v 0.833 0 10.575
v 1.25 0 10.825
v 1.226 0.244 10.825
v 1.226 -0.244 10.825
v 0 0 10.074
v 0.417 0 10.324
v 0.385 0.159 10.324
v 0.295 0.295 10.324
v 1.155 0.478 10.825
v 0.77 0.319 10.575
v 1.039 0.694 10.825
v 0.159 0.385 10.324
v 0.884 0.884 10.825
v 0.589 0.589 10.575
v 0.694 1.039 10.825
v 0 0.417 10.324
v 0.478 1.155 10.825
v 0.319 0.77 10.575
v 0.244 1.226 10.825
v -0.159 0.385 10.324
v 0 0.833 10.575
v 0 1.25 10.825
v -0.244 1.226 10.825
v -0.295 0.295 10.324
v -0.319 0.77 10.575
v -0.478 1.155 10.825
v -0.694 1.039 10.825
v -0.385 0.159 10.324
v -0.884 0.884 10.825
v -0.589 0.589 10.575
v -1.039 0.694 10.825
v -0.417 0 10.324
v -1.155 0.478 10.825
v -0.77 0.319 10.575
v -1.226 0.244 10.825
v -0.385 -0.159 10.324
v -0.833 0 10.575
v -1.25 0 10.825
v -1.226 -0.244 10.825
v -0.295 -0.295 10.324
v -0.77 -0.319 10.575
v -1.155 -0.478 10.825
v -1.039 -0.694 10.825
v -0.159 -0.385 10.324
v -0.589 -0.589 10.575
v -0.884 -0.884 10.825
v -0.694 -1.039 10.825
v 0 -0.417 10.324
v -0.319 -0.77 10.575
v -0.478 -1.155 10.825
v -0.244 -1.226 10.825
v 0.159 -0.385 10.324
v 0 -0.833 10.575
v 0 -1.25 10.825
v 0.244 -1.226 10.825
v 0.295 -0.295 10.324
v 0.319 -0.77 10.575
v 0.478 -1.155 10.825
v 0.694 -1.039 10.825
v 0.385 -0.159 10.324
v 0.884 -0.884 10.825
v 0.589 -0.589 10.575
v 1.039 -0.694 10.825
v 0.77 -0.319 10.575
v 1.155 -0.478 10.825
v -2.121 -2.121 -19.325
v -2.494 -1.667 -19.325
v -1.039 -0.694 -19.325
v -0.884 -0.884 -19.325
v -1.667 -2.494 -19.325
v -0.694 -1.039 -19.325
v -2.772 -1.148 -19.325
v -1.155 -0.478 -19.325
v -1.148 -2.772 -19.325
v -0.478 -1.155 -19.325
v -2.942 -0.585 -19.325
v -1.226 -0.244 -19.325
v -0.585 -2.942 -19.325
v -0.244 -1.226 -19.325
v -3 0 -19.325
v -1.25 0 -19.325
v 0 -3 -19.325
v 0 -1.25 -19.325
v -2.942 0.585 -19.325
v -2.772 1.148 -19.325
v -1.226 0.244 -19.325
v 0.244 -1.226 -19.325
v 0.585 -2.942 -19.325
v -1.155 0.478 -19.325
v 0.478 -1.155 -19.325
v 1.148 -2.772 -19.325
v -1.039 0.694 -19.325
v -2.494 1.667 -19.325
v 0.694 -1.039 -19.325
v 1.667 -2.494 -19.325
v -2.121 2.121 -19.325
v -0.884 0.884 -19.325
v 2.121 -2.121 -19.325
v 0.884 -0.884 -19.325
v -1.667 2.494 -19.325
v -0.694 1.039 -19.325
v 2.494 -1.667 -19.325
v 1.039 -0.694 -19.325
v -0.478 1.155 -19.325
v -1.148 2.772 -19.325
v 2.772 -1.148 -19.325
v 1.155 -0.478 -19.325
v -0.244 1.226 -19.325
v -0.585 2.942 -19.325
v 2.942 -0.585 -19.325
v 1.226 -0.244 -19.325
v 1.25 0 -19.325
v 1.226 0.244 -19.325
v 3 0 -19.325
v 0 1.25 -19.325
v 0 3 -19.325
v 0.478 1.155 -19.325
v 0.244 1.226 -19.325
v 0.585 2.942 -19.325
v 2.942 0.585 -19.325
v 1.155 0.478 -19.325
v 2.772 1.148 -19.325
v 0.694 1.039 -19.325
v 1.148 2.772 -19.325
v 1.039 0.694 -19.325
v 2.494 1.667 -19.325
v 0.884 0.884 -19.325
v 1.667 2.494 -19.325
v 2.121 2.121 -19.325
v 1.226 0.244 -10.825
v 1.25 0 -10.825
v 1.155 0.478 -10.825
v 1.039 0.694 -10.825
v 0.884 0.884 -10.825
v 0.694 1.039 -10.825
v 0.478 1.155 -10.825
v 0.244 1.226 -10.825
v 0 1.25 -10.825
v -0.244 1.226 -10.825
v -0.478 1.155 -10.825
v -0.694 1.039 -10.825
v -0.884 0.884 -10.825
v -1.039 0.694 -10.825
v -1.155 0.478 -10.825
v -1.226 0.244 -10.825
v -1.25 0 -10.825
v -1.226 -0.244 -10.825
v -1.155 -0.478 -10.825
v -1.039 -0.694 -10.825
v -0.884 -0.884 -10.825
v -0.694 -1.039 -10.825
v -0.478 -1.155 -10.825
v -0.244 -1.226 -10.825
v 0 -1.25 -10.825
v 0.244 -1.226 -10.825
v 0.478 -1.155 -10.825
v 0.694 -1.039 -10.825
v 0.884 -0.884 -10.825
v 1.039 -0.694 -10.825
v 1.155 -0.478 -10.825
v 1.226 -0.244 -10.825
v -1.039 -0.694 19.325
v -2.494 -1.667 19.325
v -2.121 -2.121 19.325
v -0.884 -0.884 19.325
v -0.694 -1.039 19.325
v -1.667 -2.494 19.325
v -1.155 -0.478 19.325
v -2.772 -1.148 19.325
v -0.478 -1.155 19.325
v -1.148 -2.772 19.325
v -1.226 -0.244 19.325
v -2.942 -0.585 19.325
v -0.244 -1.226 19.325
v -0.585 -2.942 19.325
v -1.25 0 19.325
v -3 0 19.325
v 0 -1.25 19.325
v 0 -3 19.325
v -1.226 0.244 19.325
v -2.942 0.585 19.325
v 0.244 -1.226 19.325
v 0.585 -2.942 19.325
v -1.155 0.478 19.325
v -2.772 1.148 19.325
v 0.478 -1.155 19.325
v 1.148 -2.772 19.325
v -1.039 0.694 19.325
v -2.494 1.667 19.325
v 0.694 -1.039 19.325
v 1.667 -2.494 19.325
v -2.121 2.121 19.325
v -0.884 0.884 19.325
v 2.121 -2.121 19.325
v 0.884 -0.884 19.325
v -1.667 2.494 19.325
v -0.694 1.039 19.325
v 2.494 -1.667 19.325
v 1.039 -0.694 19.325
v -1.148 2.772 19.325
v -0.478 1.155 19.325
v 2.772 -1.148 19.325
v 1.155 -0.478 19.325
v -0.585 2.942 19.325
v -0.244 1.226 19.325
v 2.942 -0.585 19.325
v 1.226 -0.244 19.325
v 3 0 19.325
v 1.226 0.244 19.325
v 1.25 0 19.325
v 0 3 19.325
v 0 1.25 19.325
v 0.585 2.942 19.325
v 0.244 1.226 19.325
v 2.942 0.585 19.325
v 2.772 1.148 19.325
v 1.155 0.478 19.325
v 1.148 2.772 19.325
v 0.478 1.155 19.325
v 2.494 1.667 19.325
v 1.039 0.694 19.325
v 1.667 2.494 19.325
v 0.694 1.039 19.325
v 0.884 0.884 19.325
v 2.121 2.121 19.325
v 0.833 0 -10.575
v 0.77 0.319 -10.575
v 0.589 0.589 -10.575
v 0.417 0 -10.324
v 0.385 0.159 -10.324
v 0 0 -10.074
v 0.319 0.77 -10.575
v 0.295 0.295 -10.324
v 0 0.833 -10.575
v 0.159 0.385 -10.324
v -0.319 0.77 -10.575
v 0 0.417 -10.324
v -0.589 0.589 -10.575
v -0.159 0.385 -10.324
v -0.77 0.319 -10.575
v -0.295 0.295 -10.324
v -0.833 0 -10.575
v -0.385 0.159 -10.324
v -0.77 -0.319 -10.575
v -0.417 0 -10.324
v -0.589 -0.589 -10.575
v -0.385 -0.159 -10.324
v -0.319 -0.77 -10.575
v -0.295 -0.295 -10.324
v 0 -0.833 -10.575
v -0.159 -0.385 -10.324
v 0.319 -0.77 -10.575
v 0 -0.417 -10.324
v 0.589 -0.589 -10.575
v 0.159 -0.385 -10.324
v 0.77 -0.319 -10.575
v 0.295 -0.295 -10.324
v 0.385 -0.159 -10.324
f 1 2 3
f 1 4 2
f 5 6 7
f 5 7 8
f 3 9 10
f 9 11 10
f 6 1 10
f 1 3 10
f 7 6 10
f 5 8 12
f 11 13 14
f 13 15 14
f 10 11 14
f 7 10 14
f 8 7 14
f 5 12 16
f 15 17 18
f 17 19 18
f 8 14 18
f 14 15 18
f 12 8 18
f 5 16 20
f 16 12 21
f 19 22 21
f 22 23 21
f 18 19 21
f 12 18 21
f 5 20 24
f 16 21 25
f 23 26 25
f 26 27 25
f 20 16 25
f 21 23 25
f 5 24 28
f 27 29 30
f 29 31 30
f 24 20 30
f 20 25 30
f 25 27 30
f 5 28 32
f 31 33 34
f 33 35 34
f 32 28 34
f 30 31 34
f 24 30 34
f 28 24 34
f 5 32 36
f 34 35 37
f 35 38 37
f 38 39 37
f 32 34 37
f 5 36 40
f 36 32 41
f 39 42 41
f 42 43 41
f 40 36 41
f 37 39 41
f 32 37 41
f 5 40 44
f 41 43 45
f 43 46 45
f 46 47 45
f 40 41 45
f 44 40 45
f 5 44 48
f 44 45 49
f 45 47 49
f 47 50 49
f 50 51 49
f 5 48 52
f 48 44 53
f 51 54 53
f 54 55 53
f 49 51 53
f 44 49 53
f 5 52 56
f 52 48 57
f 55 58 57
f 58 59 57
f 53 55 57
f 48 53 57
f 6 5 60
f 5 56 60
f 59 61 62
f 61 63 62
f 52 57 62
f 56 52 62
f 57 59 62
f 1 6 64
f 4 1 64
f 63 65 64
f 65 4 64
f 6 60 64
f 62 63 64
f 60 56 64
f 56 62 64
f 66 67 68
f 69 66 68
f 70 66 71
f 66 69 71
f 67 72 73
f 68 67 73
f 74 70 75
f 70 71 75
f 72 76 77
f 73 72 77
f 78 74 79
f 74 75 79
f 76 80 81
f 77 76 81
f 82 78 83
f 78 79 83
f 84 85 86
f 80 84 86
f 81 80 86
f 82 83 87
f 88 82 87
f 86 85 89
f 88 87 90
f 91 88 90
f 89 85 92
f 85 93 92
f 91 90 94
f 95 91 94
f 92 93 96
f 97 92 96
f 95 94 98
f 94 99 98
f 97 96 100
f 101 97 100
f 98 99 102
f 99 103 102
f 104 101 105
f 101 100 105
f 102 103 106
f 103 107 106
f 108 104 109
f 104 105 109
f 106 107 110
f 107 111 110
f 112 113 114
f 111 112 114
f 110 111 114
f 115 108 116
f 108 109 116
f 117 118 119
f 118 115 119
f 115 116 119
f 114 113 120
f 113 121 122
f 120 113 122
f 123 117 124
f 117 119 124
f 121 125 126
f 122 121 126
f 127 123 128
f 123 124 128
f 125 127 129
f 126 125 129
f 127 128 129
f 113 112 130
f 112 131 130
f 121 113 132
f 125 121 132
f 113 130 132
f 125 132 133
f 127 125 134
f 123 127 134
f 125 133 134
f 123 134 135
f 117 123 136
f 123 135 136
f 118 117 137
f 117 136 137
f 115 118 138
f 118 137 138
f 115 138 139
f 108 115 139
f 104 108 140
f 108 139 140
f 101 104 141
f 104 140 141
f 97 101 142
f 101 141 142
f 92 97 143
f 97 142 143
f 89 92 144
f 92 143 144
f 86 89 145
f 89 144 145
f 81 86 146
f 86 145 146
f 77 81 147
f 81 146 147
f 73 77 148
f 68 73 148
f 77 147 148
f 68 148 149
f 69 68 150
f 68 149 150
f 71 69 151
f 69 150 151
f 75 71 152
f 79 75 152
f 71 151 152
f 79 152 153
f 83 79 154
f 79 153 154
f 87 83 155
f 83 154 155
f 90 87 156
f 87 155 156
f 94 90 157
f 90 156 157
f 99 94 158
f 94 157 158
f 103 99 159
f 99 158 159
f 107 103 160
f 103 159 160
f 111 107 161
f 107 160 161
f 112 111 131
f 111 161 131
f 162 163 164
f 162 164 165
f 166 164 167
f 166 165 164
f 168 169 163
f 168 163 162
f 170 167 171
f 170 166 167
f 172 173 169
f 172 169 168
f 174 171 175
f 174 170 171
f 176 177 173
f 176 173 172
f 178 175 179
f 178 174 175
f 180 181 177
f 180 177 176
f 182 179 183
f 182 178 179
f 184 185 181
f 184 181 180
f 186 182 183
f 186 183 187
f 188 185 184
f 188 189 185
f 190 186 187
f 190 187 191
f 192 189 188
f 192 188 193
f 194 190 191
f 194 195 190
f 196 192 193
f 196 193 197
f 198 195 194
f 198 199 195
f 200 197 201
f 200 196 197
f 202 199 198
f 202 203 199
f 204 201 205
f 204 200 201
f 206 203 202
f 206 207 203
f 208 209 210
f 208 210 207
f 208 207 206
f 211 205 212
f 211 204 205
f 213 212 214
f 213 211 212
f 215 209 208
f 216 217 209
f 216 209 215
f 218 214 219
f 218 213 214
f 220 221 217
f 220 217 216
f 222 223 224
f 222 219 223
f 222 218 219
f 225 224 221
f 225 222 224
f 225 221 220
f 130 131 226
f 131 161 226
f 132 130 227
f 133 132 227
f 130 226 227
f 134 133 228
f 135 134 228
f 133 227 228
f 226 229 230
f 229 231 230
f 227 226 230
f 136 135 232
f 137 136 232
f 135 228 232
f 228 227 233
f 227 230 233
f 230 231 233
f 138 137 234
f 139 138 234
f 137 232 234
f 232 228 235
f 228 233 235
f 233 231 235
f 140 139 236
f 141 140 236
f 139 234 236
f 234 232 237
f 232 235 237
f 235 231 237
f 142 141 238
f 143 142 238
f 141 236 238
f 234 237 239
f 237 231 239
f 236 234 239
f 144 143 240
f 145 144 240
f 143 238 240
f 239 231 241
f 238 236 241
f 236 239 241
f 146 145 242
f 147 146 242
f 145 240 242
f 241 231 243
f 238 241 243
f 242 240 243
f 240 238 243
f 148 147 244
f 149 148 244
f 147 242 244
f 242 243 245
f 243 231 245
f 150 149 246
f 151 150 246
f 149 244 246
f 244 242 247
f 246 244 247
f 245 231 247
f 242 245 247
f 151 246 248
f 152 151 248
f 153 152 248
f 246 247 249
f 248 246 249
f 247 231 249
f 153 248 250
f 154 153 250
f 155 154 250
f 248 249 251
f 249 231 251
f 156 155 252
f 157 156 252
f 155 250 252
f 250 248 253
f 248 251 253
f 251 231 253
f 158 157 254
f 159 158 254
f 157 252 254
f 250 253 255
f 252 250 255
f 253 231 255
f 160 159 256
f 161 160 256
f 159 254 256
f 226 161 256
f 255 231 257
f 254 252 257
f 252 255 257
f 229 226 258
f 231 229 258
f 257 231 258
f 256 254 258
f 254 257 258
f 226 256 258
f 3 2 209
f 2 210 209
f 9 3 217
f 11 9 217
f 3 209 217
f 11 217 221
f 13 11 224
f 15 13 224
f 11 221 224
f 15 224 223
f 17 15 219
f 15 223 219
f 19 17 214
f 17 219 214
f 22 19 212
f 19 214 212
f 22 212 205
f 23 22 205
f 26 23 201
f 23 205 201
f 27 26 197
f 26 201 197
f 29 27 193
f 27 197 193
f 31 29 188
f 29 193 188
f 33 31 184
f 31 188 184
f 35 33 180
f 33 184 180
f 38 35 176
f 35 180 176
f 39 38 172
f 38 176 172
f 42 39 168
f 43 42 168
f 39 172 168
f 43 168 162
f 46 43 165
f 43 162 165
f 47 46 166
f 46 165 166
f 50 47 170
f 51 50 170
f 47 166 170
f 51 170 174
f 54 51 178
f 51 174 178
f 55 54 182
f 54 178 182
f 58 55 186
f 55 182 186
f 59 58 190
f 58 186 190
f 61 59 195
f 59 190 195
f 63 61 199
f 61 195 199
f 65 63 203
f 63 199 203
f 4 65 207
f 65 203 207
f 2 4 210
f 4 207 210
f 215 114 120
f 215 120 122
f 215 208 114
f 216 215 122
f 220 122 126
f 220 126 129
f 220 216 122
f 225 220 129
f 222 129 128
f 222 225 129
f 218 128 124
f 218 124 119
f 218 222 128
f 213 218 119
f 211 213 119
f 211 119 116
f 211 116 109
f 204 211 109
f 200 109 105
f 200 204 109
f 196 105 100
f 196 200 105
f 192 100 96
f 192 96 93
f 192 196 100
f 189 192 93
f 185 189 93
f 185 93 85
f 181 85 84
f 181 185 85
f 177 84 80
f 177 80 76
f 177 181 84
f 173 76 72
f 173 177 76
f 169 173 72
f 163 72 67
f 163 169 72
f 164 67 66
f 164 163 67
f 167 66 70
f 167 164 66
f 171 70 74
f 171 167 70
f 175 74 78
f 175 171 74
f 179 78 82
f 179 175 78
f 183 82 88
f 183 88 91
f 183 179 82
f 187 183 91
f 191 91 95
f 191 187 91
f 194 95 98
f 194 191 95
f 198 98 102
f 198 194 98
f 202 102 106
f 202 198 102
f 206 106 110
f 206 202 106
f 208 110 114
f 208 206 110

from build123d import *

# Parameters (mm, degrees)
SKETCH_1_R      = 3
SKETCH_1_R_2    = 1.6
EXTRUDE_1_DEPTH = 19.325


# Read off the part's stored shape, not the designer's step: M3x0.5 ねじ穴1
with BuildPart() as part:
    # ｽｹｯﾁ1 → ﾎﾞｽ - 押し出し1 (new, symmetric)
    # profile 1 of 2: a face of its own
    with BuildSketch(Plane.XY):
        Circle(SKETCH_1_R)
        Circle(SKETCH_1_R_2, mode=Mode.SUBTRACT)
    # profile 2 of 2: a face of its own
    with BuildSketch(Plane.XY):
        Circle(SKETCH_1_R_2)
    extrude(amount=EXTRUDE_1_DEPTH, both=True)

    # M3x0.5 ねじ穴1 outline → M3x0.5 ねじ穴1 (revolve, cut)
    with BuildSketch(Plane.XZ):
        Polygon((1.25, -10.825), (0, -10.073924226), (0, -19.325), (1.25, -19.325), align=None)
        Polygon((0, 19.325), (0, 10.073924226), (1.25, 10.825), (1.25, 19.325), align=None)
    revolve(axis=Axis((0, 0, 0), (0, 0, 1)), mode=Mode.SUBTRACT)


solid = part.part
